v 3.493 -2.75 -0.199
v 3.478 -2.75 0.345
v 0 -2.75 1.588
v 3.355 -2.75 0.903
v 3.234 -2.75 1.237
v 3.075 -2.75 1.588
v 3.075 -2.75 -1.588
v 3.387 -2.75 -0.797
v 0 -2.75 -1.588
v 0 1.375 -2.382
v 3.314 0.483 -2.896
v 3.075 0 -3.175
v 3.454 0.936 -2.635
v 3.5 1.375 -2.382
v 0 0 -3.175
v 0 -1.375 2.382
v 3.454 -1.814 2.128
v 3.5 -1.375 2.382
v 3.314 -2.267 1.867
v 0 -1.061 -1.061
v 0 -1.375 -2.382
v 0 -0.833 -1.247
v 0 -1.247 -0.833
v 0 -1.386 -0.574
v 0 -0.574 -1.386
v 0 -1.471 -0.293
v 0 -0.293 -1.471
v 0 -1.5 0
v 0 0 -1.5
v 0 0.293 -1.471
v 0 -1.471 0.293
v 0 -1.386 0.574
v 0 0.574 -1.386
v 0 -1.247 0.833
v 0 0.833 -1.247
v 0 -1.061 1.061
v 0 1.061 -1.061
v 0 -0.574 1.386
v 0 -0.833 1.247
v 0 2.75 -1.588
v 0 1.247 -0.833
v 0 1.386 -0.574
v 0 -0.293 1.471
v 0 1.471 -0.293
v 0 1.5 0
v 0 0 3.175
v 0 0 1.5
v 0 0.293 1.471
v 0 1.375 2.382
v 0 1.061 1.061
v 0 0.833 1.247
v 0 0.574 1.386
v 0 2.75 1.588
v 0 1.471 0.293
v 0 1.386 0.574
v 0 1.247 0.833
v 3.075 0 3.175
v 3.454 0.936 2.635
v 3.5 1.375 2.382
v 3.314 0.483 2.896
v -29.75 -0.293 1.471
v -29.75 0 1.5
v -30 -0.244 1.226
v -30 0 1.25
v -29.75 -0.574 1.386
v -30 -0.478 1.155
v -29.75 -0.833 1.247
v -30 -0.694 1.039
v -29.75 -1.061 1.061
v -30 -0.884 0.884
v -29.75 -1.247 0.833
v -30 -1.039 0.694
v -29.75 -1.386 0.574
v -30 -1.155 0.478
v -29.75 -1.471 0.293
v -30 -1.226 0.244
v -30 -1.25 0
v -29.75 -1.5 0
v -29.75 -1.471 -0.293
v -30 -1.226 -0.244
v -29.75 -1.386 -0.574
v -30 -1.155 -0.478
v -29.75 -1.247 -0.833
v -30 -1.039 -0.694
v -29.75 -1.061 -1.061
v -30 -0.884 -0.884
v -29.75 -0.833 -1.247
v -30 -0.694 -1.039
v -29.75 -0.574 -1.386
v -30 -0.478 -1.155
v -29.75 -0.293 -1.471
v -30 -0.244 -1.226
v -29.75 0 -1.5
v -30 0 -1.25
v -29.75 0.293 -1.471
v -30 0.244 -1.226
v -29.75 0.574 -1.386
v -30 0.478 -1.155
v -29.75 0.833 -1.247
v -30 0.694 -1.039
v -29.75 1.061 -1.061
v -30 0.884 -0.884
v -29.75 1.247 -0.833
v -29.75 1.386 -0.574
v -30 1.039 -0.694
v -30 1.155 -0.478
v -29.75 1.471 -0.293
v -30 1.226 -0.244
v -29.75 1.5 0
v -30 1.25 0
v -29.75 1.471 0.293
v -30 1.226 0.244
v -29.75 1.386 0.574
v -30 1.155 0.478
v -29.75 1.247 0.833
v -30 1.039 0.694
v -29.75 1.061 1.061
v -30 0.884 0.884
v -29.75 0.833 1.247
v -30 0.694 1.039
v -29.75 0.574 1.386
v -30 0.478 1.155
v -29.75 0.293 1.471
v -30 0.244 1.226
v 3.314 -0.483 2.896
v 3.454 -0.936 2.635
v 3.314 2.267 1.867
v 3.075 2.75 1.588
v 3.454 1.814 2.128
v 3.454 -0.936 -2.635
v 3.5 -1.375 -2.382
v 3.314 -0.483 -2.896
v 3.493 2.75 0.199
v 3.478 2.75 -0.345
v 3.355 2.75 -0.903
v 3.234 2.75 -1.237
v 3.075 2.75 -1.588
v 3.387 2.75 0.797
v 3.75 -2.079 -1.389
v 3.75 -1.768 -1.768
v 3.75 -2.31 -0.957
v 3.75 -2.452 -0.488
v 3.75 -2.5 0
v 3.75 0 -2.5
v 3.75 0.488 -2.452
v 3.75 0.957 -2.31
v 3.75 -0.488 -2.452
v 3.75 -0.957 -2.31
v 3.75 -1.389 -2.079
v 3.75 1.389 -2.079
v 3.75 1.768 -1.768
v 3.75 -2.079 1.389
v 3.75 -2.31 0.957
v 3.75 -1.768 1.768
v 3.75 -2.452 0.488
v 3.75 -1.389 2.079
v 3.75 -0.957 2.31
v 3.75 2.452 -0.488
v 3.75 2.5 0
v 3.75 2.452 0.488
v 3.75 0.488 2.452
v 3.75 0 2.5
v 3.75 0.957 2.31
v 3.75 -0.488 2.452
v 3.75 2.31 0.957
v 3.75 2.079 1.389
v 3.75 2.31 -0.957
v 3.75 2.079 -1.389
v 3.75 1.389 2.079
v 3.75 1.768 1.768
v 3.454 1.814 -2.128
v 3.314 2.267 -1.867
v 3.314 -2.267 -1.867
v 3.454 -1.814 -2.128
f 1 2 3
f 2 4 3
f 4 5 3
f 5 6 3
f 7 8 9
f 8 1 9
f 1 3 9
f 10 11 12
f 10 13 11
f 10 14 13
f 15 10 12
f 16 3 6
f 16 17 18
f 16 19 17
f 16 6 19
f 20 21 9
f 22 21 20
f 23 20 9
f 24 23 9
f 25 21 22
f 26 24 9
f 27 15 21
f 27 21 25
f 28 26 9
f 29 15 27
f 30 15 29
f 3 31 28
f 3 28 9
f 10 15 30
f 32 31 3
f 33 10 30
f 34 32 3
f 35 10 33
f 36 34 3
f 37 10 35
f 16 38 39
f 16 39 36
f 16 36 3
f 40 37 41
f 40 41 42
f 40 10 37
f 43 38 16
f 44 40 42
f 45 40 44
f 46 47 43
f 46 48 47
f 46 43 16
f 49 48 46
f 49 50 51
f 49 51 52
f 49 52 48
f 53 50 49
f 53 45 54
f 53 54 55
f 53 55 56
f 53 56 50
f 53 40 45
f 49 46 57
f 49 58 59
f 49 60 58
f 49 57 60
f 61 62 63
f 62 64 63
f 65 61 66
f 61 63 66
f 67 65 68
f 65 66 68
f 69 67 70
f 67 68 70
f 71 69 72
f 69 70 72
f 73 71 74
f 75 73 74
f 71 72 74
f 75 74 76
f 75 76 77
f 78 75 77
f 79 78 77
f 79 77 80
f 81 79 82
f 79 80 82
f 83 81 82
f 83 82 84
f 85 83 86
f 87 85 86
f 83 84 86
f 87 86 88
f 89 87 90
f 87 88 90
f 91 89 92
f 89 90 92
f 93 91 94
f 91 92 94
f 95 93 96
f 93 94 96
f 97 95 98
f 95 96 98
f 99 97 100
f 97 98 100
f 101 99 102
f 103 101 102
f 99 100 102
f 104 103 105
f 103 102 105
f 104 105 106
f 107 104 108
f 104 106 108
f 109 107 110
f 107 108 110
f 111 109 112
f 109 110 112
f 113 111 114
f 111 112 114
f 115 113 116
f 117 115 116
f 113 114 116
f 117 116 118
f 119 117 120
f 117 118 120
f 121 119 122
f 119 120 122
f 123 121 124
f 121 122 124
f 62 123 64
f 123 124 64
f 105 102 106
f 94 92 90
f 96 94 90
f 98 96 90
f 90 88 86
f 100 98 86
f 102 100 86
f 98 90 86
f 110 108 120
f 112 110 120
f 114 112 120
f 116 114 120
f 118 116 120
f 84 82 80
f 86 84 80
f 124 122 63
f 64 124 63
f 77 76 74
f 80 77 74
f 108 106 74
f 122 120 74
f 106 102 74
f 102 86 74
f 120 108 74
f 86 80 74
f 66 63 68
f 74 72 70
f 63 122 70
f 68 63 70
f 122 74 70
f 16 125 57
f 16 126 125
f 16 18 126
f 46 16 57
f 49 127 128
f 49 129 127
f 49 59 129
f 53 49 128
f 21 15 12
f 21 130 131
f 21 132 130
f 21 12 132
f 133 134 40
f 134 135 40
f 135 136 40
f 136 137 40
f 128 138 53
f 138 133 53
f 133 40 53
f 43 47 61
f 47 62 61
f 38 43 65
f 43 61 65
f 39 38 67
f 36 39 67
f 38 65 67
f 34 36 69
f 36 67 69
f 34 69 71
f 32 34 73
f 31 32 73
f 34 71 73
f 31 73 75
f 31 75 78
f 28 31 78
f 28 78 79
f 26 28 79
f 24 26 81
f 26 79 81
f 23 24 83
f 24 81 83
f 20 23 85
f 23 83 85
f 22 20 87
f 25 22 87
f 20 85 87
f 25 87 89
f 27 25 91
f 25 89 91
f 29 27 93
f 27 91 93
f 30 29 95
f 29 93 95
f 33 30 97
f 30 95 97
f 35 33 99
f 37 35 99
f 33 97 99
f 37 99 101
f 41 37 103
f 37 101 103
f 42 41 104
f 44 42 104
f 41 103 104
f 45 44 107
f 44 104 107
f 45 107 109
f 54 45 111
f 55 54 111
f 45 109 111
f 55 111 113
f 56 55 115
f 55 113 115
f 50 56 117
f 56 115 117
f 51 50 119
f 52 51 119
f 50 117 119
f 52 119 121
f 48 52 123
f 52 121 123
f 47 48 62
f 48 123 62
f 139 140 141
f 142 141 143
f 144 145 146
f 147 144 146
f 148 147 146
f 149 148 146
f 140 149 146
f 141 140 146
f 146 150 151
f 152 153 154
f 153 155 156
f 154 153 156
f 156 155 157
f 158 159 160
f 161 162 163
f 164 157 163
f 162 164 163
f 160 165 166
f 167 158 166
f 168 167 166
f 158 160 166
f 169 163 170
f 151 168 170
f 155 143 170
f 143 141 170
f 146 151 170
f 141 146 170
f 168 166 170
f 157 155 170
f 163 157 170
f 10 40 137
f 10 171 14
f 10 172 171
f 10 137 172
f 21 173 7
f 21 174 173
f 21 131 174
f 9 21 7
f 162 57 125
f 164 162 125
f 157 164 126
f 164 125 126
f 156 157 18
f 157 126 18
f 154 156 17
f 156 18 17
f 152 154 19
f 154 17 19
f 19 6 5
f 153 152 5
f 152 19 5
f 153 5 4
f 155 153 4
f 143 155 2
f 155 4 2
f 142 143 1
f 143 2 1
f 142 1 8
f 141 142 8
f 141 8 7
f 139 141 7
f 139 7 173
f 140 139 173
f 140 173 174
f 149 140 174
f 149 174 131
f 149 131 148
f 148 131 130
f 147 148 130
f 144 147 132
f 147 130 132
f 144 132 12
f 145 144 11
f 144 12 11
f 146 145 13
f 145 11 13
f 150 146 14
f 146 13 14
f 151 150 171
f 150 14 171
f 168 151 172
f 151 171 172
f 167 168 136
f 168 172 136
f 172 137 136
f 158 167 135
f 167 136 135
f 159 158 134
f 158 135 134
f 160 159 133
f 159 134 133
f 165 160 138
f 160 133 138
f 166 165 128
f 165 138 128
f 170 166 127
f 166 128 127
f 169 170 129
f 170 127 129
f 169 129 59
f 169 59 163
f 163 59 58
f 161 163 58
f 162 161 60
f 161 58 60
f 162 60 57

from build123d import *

# Parameters (mm, degrees)
BOSS_EXTRUDE1_DEPTH = 3.75


with BuildPart() as part:
    # Sketch1 → Revolve1 (revolve)
    with BuildSketch(Plane.XY, mode=Mode.PRIVATE) as revolve1_sk:
        Polygon((0, 0), (0, 1.5), (-29.75, 1.5), (-30, 1.25), (-30, 0), align=None)
    revolve(revolve1_sk.sketch.rotate(Axis((-30, 0, 0), (1, 0, 0)), 90), axis=Axis((-30, 0, 0), (1, 0, 0)))

    # Sketch2 → Boss-Extrude1 (add)
    with BuildSketch(Plane(origin=(0, 0, 0), x_dir=(0, 0, -1), z_dir=(1, 0, 0))):
        Polygon((-1.58771324, 2.75), (0, 2.75), (1.58771324, 2.75), (2.38156986, 1.375), (3.175426481, 0), (2.38156986, -1.375), (1.58771324, -2.75), (0, -2.75), (-1.58771324, -2.75), (-2.38156986, -1.375), (-3.175426481, 0), (-2.38156986, 1.375), align=None)
    extrude(amount=BOSS_EXTRUDE1_DEPTH)

    # Sketch3 → Cut-Revolve3 (revolve, cut)
    with BuildSketch(Plane.XY, mode=Mode.PRIVATE) as cut_revolve3_sk:
        Polygon((4, -2.25), (3.5, -2.75), (2.25, -4), (5.25, -4), (5.25, -1), align=None)
    revolve(cut_revolve3_sk.sketch.rotate(Axis((0, 0, 0), (1, 0, 0)), 270), axis=Axis((0, 0, 0), (1, 0, 0)), mode=Mode.SUBTRACT)


solid = part.part
